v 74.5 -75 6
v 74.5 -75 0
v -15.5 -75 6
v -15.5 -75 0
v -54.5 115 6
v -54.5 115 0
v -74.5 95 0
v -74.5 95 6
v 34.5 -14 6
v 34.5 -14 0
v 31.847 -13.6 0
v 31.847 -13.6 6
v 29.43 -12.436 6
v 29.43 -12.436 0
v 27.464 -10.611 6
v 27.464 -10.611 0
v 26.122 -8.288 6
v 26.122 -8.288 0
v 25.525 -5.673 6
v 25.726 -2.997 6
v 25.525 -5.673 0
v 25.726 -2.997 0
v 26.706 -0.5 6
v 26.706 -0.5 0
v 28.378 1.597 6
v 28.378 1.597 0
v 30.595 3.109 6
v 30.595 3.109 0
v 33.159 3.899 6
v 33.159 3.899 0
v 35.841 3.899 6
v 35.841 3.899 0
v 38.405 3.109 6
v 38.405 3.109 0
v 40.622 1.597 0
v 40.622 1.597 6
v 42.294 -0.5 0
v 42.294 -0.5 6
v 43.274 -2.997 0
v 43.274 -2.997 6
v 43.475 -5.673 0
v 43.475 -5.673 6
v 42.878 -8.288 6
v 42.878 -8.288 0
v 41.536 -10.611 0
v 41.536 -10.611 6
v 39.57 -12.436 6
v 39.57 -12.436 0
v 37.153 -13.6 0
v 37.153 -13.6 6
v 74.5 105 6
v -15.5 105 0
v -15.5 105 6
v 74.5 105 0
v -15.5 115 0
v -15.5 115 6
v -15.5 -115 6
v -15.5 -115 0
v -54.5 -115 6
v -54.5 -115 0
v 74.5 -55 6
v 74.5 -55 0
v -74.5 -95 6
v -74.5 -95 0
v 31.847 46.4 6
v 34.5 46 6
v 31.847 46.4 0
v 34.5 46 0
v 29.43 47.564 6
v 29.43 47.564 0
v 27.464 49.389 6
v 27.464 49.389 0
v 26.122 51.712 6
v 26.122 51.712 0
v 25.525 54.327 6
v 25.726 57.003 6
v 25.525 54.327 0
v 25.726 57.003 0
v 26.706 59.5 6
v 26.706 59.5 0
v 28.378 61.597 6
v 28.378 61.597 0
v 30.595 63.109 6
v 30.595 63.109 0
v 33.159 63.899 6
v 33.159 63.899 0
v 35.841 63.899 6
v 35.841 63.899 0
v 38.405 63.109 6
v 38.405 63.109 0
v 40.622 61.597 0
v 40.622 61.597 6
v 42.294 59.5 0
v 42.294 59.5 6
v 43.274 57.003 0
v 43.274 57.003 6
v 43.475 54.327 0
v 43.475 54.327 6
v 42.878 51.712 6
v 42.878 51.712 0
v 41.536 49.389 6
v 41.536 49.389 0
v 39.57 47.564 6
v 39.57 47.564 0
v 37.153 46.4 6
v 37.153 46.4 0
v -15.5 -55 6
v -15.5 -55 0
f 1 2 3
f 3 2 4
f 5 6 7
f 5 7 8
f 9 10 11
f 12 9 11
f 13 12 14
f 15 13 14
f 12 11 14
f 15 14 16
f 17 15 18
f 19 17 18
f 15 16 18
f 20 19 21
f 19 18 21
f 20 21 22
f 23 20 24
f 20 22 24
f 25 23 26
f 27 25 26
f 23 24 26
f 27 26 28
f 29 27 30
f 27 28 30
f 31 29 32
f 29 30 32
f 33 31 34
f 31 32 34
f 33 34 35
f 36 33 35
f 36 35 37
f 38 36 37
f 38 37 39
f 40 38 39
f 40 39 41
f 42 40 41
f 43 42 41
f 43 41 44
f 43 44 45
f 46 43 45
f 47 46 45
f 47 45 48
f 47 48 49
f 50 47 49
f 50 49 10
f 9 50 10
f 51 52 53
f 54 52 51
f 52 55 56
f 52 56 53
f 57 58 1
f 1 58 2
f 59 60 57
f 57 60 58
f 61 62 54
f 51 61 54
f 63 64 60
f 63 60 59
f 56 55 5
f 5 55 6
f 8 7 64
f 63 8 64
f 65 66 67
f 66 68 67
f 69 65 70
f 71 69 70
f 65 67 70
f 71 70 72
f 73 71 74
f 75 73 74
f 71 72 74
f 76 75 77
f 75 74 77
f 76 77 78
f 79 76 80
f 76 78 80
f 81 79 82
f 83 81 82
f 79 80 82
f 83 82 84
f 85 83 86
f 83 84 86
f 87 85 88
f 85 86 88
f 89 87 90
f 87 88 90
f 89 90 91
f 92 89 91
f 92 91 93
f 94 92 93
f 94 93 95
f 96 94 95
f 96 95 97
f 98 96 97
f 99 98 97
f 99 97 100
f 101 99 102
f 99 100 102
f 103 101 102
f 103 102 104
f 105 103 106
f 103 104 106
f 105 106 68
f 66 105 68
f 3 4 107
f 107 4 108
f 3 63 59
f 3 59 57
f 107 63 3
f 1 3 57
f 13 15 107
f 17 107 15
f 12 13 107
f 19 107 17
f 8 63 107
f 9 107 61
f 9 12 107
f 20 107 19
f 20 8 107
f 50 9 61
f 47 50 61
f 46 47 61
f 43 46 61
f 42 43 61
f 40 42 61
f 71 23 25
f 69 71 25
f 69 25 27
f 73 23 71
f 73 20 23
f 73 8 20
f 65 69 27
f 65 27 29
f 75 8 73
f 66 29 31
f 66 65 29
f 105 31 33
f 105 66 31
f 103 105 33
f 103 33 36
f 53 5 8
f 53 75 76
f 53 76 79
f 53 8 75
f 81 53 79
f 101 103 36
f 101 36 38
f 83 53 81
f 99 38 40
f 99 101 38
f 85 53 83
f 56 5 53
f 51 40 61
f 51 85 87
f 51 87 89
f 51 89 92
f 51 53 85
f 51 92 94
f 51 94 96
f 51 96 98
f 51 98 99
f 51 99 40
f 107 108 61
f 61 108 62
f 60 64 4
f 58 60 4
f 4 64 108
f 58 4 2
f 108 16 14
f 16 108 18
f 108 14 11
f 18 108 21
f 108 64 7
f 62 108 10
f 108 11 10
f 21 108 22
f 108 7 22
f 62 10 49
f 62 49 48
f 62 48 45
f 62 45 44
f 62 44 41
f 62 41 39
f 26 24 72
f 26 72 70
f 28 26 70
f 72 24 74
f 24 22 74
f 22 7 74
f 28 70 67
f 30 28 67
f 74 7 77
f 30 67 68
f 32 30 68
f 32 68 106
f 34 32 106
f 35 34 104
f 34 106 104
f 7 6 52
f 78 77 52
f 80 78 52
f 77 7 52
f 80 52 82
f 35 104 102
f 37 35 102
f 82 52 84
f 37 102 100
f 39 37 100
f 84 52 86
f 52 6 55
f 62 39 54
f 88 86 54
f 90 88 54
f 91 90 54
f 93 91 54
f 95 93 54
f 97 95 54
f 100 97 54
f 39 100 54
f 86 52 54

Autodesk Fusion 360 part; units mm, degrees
sketch "スケッチ1" plane through (0, 0, 0) normal (0, 0, 1) x (1, 0, 0)
  line L0 (-15.5, 115) -> (-74.5, 115)
  line L1 (-74.5, 115) -> (-74.5, -115)
  line L2 (-74.5, -115) -> (-15.5, -115)
  line L3 (74.5, -55) -> (74.5, 105)
  line L4 (68.0217, 105) -> (-74.5, -115) construction
  line L5 (-74.5, 115) -> (54.38, -83.9422) construction
  line L6 (-15.5, 115) -> (-15.5, 105)
  line L7 (-15.5, 105) -> (74.5, 105)
  line L8 (-74.5, -115) -> (-15.5, -115) construction
  line L9 (-15.5, -115) -> (74.5, -75)
  line L10 (74.5, -75) -> (-15.5, -75)
  line L11 (-15.5, -75) -> (-15.5, -55)
  line L12 (-15.5, -55) -> (74.5, -55)
  dimension "d2" = 230
  dimension "d5" = 59
  dimension "d7" = 90
  dimension "d8" = 20
extrude "押し出し1" add sketch "スケッチ1" along normal blind 6
chamfer "面取り1" distance 20 angle 45 2 edges at (-74.5, -115, 3) (-74.5, 115, 3)
sketch "スケッチ2" plane through (0, 0, 6) normal (0, 0, 1) x (-1, 0, 0)
  line L0 (54.5, -115) -> (74.5, -95)
  line L1 (74.5, -95) -> (74.5, 95)
  line L2 (74.5, 95) -> (54.5, 115)
  line L3 (54.5, 115) -> (15.5, 115)
  line L4 (15.5, 115) -> (-74.5, 75)
  line L5 (-74.5, 75) -> (15.5, 75)
  line L6 (15.5, 75) -> (15.5, 55)
  line L7 (15.5, 55) -> (-74.5, 55)
  line L8 (-74.5, 55) -> (-74.5, -105)
  line L9 (-74.5, -105) -> (15.5, -105)
  line L10 (15.5, -105) -> (15.5, -115)
  line L11 (15.5, -115) -> (54.5, -115)
  line L12 (-74.5, -105) -> (-34.5, -105) construction
  line L13 (-34.5, -105) -> (-34.5, -55) construction
  line L14 (-34.5, -55) -> (-74.5, -55) construction
  line L15 (-74.5, -55) -> (-74.5, -105) construction
  line L16 (-34.5, -55) -> (-34.5, 5) construction
  point P0 (-34.5, -55)
  point P1 (-34.5, 5)
  dimension "d12" = 40
  dimension "d13" = 50
  dimension "d14" = 60
hole "穴1" at (34.5, 55, 6) at (34.5, -5, 6) direction (0, 0, -1) diameter 18 end through all
equation "d5 = 20 mm + 39 mm"
